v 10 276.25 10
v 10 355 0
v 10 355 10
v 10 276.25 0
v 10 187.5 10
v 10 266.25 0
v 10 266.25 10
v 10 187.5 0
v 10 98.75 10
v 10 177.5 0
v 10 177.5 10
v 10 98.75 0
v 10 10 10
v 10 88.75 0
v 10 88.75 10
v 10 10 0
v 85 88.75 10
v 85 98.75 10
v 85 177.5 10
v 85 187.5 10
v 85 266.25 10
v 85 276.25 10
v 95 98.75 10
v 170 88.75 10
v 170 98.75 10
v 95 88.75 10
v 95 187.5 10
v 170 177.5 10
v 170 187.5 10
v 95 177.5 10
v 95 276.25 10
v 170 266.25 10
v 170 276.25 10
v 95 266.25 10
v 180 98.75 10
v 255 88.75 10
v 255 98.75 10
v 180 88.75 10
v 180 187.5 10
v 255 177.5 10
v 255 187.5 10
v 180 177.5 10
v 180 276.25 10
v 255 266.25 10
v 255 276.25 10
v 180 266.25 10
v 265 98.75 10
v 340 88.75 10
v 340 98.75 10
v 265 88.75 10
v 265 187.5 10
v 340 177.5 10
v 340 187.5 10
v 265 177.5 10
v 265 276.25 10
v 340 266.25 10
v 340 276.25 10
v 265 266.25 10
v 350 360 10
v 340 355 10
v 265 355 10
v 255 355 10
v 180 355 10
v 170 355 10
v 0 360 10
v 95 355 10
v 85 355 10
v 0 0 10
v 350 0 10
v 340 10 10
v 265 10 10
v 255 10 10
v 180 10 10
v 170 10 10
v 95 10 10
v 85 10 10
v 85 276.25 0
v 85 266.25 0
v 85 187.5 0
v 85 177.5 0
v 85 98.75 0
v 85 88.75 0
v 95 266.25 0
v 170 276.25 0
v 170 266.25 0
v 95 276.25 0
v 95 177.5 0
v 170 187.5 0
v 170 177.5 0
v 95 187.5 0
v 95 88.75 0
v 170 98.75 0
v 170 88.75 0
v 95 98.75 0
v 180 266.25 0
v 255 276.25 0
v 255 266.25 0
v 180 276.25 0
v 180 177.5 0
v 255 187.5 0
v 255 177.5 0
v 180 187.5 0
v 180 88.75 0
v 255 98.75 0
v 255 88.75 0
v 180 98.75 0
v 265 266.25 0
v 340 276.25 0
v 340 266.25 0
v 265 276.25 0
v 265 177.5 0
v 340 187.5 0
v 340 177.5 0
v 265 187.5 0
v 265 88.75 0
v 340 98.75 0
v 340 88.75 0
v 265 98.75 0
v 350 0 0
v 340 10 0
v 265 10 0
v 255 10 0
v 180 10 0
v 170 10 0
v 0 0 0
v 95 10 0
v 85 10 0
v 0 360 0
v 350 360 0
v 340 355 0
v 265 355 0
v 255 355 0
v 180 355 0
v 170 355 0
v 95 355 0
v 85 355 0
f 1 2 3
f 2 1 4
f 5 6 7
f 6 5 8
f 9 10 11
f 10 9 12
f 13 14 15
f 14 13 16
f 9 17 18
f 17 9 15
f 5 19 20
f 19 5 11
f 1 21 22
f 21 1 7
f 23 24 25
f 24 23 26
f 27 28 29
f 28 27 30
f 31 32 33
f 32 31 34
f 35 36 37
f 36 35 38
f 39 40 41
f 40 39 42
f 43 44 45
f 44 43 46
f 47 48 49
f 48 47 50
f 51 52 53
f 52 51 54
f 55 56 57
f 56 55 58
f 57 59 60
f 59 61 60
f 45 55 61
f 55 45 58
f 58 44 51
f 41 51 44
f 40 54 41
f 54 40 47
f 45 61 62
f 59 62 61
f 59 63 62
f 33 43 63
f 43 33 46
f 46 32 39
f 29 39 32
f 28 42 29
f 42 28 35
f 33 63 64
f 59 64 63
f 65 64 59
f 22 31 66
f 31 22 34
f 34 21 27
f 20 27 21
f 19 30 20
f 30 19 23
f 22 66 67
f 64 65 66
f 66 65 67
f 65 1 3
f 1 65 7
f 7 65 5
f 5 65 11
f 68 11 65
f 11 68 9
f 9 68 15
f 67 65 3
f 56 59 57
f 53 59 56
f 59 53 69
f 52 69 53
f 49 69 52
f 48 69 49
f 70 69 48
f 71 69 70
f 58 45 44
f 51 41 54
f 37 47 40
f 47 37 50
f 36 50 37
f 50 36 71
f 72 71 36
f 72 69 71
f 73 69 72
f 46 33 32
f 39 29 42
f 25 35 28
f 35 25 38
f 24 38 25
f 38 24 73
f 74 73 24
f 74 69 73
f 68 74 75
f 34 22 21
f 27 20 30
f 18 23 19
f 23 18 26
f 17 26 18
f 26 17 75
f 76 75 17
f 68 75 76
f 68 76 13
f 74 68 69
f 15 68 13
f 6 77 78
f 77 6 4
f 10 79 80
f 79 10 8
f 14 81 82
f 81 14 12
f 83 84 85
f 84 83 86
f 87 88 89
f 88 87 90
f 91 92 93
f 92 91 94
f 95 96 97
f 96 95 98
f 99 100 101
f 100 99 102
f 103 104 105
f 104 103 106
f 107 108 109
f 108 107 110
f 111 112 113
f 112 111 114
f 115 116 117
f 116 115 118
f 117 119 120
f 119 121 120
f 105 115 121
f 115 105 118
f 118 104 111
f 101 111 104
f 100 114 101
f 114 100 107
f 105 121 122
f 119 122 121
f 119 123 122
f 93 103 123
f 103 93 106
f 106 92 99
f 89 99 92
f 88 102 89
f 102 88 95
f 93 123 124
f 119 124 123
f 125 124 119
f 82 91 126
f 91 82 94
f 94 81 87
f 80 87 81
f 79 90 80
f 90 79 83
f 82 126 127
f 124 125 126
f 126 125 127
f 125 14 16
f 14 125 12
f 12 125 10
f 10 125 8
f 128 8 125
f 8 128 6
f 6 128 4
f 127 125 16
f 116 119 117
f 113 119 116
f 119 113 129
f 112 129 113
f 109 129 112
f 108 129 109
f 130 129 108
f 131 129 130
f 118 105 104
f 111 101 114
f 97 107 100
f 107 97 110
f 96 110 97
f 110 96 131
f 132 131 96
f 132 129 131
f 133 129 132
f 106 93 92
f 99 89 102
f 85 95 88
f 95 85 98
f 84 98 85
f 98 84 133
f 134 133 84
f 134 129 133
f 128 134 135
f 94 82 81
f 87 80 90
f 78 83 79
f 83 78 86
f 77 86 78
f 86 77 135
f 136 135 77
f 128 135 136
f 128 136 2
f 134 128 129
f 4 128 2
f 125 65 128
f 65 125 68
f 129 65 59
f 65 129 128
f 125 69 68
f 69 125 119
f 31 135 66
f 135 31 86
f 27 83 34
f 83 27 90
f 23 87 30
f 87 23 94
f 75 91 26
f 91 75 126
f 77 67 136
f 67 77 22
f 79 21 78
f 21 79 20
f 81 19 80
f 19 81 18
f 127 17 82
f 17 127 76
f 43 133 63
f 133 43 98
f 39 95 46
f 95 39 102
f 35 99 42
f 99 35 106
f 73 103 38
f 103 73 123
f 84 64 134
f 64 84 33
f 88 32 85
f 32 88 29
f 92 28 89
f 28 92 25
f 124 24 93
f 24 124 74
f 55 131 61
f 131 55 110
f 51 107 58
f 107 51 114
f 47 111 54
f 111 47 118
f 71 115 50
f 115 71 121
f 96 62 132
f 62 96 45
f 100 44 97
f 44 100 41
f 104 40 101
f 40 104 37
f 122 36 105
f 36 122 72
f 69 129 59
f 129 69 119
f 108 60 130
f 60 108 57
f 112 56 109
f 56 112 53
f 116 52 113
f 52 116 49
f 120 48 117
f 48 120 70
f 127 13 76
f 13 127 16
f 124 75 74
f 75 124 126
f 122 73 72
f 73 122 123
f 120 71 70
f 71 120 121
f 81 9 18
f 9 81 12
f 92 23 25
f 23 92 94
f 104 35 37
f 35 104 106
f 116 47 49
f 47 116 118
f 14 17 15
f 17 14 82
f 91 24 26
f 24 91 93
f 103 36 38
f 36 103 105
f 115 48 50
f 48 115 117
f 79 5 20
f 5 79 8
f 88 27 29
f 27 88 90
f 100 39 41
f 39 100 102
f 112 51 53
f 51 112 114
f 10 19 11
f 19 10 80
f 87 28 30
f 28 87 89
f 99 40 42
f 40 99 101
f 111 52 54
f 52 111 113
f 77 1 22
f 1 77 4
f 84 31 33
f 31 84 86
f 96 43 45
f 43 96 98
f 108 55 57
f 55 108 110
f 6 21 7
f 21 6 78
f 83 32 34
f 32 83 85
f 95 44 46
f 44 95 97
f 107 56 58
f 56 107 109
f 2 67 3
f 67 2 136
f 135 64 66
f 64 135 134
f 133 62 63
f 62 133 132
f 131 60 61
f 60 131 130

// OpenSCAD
// face_band.scad reused (front upper band will use the same part and be positioned via the transform)

width = 350;
band_h = 360;
thk = 10;
full_height = 720;
h_bar_count = 9;
h_gap = (full_height - h_bar_count * thk) / (h_bar_count - 1);
v_gap_count = 4;
v_bars = v_gap_count + 1;
v_gap = (width - v_bars * thk) / v_gap_count;
$fn = 32;

module face_band(w=width, bh=band_h, t=thk) {
    union() {
        for (i = [0 : v_bars - 1]) {
            x = i * (t + v_gap);
            translate([x, 0, 0]) cube([t, bh, t]);
        }
        for (j = [0 : h_bar_count - 1]) {
            y_full = j * (t + h_gap);
            if (y_full < bh && (y_full + t) > 0) {
                intersection() {
                    translate([0, y_full, 0]) cube([w, t, t]);
                    translate([0, 0, 0]) cube([w, bh, t]);
                }
            }
        }
    }
}

face_band();
